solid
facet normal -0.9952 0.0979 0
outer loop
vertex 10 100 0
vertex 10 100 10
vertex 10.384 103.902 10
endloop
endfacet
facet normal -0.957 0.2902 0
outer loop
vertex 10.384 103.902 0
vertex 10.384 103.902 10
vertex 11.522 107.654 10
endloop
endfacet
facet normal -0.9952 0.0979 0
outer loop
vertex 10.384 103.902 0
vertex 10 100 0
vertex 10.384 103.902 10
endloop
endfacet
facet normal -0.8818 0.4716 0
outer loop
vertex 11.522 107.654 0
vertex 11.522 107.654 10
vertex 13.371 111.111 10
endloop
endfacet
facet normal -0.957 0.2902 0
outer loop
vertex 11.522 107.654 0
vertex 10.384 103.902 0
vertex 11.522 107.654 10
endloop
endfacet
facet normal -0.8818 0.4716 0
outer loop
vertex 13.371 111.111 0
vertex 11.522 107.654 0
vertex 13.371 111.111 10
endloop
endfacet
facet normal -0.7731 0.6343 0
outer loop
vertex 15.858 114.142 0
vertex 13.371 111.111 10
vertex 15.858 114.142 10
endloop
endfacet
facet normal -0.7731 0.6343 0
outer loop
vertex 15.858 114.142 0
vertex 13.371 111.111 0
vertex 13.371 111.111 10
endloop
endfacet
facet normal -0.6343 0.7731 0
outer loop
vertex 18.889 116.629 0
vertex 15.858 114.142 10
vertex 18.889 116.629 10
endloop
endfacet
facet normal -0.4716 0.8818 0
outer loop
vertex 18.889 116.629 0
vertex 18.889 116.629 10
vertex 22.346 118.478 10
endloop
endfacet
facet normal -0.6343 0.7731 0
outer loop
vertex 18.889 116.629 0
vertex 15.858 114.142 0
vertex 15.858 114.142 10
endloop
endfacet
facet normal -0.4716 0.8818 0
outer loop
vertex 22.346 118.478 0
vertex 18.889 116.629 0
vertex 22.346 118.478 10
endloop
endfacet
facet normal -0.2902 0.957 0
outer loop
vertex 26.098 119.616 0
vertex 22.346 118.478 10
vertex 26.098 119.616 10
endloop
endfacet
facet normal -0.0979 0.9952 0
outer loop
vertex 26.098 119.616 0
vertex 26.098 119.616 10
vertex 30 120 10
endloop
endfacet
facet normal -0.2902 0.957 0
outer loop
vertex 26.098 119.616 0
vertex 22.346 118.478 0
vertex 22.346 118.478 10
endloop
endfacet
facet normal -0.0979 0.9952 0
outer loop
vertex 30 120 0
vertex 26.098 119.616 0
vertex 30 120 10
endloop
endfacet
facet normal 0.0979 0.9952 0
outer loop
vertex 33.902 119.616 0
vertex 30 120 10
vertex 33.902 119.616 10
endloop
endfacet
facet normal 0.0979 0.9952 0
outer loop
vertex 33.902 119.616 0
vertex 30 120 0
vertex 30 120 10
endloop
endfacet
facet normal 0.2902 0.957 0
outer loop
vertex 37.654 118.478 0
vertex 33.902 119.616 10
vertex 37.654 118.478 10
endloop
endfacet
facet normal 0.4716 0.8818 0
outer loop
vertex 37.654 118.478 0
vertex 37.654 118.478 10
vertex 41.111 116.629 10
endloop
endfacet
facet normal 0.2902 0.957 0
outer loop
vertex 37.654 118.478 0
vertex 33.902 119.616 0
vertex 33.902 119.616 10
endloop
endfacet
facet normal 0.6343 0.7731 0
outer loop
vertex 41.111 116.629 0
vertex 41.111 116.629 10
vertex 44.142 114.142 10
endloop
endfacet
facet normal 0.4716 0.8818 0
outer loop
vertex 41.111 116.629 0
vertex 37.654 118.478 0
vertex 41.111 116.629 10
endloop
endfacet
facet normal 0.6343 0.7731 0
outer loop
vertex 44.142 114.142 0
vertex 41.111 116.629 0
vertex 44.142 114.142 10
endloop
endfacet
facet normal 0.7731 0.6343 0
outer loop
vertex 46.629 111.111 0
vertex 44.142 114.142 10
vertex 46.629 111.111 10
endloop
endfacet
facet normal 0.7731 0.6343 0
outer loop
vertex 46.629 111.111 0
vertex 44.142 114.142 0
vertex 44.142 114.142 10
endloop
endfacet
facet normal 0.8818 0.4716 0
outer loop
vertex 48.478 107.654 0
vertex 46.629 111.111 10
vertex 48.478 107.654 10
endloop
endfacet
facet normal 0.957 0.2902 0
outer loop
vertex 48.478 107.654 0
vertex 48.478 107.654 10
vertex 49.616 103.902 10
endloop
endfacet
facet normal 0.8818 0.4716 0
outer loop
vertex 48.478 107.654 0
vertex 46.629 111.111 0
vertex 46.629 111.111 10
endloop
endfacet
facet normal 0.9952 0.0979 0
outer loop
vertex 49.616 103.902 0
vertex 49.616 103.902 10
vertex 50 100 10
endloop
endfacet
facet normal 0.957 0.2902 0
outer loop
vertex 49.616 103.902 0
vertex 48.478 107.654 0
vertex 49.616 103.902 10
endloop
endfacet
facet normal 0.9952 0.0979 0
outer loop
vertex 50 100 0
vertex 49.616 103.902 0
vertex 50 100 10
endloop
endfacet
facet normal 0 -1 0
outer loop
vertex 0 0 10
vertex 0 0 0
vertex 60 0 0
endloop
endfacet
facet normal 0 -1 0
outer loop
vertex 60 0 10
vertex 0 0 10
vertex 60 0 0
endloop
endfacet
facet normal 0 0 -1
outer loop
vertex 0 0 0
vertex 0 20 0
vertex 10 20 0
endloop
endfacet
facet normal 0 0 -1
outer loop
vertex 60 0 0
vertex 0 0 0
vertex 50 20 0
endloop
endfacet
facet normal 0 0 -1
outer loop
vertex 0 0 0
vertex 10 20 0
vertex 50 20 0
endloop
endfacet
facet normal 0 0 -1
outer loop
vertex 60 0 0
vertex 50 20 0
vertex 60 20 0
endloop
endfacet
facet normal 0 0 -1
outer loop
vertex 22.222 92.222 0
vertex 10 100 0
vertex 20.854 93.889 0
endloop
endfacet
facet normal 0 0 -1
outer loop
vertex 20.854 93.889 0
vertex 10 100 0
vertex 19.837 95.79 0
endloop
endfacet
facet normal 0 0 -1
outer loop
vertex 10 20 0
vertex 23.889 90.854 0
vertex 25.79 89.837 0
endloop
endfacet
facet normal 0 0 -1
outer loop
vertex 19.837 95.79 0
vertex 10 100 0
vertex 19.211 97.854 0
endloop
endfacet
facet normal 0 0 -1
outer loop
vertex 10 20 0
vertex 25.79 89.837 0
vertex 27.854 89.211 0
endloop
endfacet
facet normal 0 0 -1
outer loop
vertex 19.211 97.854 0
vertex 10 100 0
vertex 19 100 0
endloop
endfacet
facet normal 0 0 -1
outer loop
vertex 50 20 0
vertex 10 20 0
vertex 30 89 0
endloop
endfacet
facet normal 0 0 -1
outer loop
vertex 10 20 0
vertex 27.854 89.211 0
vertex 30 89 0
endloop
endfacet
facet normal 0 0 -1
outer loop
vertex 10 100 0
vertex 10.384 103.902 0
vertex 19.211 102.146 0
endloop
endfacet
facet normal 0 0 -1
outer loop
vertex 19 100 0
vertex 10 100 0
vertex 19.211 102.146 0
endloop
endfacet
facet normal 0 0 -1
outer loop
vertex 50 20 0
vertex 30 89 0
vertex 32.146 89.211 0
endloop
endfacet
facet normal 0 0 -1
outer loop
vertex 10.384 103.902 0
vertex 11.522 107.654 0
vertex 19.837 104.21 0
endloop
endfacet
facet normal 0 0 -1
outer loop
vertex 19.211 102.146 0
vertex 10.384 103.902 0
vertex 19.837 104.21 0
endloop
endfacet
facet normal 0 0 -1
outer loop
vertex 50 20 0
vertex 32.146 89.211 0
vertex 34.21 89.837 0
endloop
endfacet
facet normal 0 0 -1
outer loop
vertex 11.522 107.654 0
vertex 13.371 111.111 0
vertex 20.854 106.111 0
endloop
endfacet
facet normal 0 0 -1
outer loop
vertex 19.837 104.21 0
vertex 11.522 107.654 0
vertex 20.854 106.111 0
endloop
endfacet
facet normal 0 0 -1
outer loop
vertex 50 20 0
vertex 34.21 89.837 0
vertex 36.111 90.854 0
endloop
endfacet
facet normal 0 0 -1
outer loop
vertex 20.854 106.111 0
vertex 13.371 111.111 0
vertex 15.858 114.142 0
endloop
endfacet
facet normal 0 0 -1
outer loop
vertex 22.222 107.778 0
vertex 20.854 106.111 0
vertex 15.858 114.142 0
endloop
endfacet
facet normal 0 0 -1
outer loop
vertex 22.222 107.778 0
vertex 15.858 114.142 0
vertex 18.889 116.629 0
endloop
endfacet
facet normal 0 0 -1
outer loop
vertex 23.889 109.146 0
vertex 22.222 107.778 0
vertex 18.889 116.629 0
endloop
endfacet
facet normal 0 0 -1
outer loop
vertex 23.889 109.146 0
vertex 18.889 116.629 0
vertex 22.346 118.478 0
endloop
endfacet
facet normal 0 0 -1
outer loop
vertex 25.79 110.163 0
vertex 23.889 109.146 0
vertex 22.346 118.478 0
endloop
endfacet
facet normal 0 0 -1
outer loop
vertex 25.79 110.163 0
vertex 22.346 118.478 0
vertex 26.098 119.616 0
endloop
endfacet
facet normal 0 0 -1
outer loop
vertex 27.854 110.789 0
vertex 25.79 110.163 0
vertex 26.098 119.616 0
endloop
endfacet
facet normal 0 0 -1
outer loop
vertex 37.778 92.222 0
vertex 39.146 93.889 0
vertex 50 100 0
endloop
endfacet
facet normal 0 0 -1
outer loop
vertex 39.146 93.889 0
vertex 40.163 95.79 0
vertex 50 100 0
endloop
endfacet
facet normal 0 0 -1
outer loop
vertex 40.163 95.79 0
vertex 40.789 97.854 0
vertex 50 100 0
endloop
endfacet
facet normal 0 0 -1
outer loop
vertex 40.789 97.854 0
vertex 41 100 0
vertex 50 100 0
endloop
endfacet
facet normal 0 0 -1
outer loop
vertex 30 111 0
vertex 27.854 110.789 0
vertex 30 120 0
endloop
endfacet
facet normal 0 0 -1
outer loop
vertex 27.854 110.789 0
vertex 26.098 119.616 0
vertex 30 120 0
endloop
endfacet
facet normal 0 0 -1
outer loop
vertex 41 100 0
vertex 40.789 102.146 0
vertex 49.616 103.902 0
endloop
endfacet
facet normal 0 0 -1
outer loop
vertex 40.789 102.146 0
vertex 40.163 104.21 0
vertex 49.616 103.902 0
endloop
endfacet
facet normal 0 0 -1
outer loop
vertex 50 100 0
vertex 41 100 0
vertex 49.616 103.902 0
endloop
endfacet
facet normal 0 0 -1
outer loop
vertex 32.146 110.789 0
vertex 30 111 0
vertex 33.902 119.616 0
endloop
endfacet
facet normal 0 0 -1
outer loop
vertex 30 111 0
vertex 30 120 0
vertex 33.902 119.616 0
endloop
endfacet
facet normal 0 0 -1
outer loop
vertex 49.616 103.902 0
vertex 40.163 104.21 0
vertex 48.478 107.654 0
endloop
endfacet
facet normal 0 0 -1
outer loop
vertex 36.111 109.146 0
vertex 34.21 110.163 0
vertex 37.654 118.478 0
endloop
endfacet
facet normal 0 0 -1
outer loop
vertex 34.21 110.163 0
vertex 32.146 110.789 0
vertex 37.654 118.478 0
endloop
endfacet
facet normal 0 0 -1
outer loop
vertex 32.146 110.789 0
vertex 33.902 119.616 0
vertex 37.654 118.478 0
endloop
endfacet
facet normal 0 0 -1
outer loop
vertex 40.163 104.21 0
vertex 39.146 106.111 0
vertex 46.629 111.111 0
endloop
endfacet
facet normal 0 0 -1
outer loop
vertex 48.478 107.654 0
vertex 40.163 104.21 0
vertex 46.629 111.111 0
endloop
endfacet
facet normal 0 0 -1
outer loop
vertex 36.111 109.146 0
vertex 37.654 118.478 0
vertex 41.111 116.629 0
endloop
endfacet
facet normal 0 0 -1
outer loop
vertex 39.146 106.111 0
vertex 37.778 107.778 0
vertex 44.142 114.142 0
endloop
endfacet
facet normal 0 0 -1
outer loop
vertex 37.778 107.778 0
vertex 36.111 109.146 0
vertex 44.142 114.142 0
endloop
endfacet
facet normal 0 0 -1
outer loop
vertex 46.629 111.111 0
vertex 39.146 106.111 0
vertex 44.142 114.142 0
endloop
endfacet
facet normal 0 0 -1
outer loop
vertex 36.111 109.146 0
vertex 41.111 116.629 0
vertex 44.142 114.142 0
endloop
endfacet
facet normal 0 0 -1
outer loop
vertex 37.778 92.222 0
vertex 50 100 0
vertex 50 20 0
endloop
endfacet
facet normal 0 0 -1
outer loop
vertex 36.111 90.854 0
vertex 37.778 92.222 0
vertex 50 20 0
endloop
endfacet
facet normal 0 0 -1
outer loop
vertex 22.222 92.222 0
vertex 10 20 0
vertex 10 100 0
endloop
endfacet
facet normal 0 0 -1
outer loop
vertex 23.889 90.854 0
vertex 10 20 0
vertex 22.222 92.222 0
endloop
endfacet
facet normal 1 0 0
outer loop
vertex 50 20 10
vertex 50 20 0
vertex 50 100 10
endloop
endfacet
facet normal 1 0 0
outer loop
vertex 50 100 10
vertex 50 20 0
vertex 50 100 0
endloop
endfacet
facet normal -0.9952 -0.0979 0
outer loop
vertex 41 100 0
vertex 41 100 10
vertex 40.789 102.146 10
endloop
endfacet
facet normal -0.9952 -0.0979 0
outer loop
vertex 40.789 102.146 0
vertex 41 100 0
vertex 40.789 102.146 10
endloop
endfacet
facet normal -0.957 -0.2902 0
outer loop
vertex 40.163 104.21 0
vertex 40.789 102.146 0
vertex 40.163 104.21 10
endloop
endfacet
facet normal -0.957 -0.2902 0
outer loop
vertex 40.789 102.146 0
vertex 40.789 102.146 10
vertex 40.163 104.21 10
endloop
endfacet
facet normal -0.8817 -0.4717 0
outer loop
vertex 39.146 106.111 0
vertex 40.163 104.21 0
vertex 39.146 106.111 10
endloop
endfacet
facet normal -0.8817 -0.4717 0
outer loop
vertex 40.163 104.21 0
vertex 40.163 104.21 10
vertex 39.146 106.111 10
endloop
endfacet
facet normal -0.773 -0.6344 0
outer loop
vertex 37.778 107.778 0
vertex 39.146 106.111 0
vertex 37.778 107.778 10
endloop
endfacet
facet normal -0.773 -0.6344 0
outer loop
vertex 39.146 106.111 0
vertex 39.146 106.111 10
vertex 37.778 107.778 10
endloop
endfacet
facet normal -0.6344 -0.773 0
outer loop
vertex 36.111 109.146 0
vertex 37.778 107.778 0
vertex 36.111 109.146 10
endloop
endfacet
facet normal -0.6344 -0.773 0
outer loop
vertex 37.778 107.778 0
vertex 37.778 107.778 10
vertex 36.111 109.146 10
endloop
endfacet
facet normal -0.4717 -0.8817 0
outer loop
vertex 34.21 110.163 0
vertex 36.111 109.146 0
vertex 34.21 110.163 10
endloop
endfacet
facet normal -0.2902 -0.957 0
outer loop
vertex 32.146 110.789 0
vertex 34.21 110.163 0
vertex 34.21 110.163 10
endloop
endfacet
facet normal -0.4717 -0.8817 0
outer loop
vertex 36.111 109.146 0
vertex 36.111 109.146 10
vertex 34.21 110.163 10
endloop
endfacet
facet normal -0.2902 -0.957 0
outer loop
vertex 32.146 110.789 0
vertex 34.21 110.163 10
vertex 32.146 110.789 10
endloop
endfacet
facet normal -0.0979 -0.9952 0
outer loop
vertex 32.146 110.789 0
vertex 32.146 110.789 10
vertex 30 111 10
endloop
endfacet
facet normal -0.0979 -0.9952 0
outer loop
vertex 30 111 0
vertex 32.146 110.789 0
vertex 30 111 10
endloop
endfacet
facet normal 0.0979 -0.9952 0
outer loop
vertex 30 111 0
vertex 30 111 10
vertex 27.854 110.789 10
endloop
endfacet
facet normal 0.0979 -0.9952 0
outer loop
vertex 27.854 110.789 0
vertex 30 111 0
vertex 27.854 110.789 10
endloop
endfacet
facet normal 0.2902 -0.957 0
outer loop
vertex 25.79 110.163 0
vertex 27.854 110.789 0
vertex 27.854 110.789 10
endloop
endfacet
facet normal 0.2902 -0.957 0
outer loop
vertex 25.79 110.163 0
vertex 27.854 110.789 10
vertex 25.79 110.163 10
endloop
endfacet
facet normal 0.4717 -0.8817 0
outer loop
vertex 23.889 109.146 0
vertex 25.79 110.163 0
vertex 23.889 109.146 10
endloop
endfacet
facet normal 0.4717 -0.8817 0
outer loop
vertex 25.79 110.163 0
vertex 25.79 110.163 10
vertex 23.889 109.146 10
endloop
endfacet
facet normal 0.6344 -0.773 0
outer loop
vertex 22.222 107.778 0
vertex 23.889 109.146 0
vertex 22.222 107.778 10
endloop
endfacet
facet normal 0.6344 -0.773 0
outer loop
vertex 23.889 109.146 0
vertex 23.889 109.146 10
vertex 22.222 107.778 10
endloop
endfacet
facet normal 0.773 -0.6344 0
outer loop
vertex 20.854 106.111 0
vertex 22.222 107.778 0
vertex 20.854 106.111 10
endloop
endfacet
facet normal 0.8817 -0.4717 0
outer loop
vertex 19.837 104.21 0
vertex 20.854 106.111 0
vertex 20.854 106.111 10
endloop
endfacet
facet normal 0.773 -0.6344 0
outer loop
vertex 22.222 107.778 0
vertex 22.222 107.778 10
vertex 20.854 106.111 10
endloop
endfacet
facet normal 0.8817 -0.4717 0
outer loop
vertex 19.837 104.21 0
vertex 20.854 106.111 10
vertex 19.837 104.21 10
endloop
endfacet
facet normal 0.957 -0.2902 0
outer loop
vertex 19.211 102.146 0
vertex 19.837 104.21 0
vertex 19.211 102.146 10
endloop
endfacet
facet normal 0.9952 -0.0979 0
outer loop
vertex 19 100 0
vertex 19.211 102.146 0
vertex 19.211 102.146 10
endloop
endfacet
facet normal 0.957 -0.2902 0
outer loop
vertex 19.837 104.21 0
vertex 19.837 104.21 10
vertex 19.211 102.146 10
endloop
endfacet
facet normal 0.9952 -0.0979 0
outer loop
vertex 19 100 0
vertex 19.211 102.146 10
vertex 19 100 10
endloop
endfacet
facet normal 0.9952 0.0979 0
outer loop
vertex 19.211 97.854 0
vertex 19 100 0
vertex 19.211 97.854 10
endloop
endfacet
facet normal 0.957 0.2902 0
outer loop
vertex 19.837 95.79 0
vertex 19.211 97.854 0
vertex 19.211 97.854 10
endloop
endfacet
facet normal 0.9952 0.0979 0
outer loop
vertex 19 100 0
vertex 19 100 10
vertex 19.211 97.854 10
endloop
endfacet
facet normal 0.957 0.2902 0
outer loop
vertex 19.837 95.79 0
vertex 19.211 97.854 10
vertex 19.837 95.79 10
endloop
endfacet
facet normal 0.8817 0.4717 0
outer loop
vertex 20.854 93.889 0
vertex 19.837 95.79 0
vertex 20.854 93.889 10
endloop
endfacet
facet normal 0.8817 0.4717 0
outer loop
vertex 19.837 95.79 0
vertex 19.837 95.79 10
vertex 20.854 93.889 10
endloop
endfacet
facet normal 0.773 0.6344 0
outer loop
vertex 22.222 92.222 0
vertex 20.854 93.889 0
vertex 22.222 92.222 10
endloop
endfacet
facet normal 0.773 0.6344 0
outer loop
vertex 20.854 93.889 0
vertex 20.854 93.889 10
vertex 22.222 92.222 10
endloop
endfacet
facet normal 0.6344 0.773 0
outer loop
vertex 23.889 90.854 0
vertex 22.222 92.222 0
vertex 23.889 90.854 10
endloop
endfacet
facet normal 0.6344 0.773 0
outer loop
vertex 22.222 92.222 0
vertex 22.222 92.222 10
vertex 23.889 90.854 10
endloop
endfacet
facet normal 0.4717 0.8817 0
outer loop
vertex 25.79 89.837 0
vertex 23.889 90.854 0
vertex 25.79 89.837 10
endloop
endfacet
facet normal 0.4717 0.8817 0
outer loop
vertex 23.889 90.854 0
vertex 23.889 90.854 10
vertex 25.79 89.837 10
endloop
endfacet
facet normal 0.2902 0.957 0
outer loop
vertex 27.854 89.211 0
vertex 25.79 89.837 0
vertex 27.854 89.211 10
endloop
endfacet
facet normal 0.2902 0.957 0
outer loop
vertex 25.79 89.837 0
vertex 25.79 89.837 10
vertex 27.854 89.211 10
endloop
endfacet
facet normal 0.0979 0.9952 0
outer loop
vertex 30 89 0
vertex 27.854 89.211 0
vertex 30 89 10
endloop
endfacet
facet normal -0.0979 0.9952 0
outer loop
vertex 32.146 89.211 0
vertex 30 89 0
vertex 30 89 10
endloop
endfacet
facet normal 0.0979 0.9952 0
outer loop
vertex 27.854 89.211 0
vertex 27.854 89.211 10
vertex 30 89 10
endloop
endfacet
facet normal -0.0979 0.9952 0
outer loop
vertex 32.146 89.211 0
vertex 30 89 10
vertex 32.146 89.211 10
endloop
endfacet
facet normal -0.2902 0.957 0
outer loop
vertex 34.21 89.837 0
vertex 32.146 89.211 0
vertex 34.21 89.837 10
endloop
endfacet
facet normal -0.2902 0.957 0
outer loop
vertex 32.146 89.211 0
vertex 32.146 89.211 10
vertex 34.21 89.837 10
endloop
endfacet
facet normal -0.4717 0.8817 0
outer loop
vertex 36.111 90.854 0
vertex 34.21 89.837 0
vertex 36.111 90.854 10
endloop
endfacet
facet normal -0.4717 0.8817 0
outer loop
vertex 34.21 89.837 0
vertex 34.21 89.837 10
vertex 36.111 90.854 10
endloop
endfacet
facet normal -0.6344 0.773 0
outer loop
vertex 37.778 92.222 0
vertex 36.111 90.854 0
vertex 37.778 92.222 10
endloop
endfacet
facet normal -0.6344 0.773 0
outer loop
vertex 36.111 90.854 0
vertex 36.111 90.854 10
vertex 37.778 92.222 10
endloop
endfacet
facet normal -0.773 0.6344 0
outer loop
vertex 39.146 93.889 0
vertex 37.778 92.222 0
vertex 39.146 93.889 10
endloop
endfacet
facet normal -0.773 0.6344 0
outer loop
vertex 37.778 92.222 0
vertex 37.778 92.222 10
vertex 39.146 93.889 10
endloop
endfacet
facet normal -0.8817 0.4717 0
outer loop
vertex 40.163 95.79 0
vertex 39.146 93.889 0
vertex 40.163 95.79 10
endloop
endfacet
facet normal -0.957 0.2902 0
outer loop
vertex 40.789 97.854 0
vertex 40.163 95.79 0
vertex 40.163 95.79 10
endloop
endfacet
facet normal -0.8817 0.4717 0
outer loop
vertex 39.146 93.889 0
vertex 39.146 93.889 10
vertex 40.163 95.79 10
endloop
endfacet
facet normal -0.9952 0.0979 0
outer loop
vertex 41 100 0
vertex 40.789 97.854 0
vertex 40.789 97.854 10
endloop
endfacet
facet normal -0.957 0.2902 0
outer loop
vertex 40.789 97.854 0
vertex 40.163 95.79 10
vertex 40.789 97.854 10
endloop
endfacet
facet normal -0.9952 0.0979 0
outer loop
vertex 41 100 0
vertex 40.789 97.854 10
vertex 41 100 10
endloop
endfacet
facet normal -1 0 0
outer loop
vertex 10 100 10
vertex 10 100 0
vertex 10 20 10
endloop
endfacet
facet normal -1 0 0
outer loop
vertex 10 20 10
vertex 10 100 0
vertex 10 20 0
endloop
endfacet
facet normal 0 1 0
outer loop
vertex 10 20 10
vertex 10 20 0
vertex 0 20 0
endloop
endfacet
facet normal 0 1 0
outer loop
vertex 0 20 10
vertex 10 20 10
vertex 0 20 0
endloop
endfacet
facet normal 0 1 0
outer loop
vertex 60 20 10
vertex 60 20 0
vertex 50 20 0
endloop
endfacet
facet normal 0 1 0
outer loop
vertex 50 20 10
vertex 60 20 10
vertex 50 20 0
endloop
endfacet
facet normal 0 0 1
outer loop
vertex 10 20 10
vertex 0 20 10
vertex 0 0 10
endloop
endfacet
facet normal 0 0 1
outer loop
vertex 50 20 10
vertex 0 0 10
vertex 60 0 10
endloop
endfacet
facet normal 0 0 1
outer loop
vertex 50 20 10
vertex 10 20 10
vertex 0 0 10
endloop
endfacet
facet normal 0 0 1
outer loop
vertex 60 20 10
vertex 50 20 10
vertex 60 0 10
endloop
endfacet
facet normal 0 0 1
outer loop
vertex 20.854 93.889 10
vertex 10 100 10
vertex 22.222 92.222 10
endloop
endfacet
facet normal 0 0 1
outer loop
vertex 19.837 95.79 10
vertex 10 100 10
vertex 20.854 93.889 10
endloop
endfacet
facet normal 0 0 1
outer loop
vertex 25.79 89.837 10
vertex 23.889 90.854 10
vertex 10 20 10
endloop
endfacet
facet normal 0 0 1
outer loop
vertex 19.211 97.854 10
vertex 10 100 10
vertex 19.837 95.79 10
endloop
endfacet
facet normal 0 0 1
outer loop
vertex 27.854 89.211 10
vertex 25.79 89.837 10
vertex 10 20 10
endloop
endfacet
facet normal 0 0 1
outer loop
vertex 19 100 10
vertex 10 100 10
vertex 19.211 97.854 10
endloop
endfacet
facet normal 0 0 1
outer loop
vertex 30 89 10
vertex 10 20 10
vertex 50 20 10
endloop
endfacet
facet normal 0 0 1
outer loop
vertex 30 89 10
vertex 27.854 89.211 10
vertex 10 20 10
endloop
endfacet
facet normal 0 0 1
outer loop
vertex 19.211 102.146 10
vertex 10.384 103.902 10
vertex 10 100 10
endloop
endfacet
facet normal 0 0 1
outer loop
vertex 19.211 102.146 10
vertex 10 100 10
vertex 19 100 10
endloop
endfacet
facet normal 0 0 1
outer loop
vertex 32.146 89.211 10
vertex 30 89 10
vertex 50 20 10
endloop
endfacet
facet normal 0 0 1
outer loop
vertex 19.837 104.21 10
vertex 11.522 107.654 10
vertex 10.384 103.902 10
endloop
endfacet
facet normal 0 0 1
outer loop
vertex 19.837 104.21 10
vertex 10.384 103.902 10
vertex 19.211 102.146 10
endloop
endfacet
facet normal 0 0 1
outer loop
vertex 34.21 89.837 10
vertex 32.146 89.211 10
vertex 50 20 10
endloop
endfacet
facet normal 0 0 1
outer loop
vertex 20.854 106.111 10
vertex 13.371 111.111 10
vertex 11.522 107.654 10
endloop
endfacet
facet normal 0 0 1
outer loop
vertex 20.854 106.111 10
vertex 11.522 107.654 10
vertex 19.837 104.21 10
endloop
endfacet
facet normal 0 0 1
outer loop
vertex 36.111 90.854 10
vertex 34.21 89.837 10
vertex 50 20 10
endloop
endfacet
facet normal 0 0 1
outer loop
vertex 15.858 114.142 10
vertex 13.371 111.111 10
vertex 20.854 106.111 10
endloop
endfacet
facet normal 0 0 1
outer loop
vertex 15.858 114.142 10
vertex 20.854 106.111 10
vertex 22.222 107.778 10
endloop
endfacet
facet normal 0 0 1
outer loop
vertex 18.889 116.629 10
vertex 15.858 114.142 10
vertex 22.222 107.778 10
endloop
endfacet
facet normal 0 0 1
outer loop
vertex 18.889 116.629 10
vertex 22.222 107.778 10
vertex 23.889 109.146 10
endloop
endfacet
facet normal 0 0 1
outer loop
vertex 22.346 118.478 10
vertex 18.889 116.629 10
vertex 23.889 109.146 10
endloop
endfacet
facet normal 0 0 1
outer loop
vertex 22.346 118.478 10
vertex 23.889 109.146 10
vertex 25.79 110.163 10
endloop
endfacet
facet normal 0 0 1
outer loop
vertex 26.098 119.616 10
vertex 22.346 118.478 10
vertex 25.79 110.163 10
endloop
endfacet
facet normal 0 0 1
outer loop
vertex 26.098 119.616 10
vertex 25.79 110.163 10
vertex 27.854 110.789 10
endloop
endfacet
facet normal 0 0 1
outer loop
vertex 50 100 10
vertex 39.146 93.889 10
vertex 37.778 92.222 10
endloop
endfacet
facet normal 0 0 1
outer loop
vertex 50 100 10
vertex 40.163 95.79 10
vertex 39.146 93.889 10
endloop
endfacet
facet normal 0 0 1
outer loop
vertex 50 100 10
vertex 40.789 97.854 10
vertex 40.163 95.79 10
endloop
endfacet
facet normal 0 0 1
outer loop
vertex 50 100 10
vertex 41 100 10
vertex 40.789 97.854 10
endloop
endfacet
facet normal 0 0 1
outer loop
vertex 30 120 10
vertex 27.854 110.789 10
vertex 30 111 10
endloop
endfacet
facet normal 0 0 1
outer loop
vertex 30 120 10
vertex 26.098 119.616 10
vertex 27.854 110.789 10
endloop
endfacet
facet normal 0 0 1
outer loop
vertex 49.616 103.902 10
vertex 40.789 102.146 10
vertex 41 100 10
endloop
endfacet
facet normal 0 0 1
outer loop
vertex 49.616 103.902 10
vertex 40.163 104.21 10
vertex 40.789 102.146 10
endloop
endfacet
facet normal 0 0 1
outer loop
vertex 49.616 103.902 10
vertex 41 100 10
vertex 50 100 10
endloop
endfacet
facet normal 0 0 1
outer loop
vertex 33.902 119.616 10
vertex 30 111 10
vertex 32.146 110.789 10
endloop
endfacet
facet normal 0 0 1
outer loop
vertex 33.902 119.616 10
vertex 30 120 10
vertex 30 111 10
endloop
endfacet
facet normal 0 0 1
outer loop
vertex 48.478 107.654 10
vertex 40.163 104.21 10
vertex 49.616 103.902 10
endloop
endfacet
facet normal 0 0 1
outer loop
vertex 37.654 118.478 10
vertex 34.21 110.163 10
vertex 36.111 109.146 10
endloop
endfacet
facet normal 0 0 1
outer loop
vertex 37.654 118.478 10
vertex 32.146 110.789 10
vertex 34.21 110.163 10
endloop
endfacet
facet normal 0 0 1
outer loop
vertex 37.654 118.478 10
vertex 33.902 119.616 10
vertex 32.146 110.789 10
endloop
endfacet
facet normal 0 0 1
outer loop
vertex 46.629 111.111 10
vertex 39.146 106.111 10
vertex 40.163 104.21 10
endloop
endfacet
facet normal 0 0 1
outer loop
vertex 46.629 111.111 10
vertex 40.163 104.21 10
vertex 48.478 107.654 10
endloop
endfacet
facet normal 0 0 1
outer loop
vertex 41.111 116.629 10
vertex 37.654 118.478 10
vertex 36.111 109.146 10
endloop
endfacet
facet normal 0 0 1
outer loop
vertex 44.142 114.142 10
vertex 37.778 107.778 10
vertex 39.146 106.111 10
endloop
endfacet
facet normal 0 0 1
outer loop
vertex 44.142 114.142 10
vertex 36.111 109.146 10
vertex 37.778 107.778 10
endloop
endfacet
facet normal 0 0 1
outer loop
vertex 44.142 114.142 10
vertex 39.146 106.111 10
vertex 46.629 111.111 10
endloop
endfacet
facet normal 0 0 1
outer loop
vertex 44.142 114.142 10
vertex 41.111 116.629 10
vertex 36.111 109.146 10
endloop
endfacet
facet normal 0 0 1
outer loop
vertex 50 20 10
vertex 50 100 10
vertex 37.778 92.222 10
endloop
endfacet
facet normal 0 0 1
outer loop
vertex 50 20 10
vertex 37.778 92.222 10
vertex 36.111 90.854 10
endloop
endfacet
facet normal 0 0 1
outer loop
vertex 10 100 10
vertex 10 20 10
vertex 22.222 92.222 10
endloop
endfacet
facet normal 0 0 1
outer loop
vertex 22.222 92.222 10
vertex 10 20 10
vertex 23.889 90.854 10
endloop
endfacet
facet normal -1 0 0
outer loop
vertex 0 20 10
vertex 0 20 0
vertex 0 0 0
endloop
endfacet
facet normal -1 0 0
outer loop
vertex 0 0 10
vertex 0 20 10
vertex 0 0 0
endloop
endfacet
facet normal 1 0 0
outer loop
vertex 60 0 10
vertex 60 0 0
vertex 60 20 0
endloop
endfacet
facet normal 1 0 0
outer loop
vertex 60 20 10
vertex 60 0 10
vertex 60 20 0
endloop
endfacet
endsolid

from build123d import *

# Parameters (mm, degrees)
BOSS_EXTRUDE1_DEPTH = 10
SKETCH2_R           = 11
CUT_EXTRUDE1_DEPTH  = 10


with BuildPart() as part:
    # Sketch1 → Boss-Extrude1 (new body)
    with BuildSketch(Plane.XY):
        Polygon((50, 20), (50, 100), (10, 100), (10, 20), (0, 20), (0, 0), (60, 0), (60, 20), align=None)
        with BuildLine():
            Line((50, 100), (10, 100))
            ThreePointArc((10, 100), (30, 120), (50, 100))
        make_face()
    extrude(amount=BOSS_EXTRUDE1_DEPTH)

    # Sketch2 → Cut-Extrude1 (cut)
    with BuildSketch(Plane.XY.offset(10)):
        with Locations((30, 100)):
            Circle(SKETCH2_R)
    extrude(amount=-CUT_EXTRUDE1_DEPTH, mode=Mode.SUBTRACT)


solid = part.part
